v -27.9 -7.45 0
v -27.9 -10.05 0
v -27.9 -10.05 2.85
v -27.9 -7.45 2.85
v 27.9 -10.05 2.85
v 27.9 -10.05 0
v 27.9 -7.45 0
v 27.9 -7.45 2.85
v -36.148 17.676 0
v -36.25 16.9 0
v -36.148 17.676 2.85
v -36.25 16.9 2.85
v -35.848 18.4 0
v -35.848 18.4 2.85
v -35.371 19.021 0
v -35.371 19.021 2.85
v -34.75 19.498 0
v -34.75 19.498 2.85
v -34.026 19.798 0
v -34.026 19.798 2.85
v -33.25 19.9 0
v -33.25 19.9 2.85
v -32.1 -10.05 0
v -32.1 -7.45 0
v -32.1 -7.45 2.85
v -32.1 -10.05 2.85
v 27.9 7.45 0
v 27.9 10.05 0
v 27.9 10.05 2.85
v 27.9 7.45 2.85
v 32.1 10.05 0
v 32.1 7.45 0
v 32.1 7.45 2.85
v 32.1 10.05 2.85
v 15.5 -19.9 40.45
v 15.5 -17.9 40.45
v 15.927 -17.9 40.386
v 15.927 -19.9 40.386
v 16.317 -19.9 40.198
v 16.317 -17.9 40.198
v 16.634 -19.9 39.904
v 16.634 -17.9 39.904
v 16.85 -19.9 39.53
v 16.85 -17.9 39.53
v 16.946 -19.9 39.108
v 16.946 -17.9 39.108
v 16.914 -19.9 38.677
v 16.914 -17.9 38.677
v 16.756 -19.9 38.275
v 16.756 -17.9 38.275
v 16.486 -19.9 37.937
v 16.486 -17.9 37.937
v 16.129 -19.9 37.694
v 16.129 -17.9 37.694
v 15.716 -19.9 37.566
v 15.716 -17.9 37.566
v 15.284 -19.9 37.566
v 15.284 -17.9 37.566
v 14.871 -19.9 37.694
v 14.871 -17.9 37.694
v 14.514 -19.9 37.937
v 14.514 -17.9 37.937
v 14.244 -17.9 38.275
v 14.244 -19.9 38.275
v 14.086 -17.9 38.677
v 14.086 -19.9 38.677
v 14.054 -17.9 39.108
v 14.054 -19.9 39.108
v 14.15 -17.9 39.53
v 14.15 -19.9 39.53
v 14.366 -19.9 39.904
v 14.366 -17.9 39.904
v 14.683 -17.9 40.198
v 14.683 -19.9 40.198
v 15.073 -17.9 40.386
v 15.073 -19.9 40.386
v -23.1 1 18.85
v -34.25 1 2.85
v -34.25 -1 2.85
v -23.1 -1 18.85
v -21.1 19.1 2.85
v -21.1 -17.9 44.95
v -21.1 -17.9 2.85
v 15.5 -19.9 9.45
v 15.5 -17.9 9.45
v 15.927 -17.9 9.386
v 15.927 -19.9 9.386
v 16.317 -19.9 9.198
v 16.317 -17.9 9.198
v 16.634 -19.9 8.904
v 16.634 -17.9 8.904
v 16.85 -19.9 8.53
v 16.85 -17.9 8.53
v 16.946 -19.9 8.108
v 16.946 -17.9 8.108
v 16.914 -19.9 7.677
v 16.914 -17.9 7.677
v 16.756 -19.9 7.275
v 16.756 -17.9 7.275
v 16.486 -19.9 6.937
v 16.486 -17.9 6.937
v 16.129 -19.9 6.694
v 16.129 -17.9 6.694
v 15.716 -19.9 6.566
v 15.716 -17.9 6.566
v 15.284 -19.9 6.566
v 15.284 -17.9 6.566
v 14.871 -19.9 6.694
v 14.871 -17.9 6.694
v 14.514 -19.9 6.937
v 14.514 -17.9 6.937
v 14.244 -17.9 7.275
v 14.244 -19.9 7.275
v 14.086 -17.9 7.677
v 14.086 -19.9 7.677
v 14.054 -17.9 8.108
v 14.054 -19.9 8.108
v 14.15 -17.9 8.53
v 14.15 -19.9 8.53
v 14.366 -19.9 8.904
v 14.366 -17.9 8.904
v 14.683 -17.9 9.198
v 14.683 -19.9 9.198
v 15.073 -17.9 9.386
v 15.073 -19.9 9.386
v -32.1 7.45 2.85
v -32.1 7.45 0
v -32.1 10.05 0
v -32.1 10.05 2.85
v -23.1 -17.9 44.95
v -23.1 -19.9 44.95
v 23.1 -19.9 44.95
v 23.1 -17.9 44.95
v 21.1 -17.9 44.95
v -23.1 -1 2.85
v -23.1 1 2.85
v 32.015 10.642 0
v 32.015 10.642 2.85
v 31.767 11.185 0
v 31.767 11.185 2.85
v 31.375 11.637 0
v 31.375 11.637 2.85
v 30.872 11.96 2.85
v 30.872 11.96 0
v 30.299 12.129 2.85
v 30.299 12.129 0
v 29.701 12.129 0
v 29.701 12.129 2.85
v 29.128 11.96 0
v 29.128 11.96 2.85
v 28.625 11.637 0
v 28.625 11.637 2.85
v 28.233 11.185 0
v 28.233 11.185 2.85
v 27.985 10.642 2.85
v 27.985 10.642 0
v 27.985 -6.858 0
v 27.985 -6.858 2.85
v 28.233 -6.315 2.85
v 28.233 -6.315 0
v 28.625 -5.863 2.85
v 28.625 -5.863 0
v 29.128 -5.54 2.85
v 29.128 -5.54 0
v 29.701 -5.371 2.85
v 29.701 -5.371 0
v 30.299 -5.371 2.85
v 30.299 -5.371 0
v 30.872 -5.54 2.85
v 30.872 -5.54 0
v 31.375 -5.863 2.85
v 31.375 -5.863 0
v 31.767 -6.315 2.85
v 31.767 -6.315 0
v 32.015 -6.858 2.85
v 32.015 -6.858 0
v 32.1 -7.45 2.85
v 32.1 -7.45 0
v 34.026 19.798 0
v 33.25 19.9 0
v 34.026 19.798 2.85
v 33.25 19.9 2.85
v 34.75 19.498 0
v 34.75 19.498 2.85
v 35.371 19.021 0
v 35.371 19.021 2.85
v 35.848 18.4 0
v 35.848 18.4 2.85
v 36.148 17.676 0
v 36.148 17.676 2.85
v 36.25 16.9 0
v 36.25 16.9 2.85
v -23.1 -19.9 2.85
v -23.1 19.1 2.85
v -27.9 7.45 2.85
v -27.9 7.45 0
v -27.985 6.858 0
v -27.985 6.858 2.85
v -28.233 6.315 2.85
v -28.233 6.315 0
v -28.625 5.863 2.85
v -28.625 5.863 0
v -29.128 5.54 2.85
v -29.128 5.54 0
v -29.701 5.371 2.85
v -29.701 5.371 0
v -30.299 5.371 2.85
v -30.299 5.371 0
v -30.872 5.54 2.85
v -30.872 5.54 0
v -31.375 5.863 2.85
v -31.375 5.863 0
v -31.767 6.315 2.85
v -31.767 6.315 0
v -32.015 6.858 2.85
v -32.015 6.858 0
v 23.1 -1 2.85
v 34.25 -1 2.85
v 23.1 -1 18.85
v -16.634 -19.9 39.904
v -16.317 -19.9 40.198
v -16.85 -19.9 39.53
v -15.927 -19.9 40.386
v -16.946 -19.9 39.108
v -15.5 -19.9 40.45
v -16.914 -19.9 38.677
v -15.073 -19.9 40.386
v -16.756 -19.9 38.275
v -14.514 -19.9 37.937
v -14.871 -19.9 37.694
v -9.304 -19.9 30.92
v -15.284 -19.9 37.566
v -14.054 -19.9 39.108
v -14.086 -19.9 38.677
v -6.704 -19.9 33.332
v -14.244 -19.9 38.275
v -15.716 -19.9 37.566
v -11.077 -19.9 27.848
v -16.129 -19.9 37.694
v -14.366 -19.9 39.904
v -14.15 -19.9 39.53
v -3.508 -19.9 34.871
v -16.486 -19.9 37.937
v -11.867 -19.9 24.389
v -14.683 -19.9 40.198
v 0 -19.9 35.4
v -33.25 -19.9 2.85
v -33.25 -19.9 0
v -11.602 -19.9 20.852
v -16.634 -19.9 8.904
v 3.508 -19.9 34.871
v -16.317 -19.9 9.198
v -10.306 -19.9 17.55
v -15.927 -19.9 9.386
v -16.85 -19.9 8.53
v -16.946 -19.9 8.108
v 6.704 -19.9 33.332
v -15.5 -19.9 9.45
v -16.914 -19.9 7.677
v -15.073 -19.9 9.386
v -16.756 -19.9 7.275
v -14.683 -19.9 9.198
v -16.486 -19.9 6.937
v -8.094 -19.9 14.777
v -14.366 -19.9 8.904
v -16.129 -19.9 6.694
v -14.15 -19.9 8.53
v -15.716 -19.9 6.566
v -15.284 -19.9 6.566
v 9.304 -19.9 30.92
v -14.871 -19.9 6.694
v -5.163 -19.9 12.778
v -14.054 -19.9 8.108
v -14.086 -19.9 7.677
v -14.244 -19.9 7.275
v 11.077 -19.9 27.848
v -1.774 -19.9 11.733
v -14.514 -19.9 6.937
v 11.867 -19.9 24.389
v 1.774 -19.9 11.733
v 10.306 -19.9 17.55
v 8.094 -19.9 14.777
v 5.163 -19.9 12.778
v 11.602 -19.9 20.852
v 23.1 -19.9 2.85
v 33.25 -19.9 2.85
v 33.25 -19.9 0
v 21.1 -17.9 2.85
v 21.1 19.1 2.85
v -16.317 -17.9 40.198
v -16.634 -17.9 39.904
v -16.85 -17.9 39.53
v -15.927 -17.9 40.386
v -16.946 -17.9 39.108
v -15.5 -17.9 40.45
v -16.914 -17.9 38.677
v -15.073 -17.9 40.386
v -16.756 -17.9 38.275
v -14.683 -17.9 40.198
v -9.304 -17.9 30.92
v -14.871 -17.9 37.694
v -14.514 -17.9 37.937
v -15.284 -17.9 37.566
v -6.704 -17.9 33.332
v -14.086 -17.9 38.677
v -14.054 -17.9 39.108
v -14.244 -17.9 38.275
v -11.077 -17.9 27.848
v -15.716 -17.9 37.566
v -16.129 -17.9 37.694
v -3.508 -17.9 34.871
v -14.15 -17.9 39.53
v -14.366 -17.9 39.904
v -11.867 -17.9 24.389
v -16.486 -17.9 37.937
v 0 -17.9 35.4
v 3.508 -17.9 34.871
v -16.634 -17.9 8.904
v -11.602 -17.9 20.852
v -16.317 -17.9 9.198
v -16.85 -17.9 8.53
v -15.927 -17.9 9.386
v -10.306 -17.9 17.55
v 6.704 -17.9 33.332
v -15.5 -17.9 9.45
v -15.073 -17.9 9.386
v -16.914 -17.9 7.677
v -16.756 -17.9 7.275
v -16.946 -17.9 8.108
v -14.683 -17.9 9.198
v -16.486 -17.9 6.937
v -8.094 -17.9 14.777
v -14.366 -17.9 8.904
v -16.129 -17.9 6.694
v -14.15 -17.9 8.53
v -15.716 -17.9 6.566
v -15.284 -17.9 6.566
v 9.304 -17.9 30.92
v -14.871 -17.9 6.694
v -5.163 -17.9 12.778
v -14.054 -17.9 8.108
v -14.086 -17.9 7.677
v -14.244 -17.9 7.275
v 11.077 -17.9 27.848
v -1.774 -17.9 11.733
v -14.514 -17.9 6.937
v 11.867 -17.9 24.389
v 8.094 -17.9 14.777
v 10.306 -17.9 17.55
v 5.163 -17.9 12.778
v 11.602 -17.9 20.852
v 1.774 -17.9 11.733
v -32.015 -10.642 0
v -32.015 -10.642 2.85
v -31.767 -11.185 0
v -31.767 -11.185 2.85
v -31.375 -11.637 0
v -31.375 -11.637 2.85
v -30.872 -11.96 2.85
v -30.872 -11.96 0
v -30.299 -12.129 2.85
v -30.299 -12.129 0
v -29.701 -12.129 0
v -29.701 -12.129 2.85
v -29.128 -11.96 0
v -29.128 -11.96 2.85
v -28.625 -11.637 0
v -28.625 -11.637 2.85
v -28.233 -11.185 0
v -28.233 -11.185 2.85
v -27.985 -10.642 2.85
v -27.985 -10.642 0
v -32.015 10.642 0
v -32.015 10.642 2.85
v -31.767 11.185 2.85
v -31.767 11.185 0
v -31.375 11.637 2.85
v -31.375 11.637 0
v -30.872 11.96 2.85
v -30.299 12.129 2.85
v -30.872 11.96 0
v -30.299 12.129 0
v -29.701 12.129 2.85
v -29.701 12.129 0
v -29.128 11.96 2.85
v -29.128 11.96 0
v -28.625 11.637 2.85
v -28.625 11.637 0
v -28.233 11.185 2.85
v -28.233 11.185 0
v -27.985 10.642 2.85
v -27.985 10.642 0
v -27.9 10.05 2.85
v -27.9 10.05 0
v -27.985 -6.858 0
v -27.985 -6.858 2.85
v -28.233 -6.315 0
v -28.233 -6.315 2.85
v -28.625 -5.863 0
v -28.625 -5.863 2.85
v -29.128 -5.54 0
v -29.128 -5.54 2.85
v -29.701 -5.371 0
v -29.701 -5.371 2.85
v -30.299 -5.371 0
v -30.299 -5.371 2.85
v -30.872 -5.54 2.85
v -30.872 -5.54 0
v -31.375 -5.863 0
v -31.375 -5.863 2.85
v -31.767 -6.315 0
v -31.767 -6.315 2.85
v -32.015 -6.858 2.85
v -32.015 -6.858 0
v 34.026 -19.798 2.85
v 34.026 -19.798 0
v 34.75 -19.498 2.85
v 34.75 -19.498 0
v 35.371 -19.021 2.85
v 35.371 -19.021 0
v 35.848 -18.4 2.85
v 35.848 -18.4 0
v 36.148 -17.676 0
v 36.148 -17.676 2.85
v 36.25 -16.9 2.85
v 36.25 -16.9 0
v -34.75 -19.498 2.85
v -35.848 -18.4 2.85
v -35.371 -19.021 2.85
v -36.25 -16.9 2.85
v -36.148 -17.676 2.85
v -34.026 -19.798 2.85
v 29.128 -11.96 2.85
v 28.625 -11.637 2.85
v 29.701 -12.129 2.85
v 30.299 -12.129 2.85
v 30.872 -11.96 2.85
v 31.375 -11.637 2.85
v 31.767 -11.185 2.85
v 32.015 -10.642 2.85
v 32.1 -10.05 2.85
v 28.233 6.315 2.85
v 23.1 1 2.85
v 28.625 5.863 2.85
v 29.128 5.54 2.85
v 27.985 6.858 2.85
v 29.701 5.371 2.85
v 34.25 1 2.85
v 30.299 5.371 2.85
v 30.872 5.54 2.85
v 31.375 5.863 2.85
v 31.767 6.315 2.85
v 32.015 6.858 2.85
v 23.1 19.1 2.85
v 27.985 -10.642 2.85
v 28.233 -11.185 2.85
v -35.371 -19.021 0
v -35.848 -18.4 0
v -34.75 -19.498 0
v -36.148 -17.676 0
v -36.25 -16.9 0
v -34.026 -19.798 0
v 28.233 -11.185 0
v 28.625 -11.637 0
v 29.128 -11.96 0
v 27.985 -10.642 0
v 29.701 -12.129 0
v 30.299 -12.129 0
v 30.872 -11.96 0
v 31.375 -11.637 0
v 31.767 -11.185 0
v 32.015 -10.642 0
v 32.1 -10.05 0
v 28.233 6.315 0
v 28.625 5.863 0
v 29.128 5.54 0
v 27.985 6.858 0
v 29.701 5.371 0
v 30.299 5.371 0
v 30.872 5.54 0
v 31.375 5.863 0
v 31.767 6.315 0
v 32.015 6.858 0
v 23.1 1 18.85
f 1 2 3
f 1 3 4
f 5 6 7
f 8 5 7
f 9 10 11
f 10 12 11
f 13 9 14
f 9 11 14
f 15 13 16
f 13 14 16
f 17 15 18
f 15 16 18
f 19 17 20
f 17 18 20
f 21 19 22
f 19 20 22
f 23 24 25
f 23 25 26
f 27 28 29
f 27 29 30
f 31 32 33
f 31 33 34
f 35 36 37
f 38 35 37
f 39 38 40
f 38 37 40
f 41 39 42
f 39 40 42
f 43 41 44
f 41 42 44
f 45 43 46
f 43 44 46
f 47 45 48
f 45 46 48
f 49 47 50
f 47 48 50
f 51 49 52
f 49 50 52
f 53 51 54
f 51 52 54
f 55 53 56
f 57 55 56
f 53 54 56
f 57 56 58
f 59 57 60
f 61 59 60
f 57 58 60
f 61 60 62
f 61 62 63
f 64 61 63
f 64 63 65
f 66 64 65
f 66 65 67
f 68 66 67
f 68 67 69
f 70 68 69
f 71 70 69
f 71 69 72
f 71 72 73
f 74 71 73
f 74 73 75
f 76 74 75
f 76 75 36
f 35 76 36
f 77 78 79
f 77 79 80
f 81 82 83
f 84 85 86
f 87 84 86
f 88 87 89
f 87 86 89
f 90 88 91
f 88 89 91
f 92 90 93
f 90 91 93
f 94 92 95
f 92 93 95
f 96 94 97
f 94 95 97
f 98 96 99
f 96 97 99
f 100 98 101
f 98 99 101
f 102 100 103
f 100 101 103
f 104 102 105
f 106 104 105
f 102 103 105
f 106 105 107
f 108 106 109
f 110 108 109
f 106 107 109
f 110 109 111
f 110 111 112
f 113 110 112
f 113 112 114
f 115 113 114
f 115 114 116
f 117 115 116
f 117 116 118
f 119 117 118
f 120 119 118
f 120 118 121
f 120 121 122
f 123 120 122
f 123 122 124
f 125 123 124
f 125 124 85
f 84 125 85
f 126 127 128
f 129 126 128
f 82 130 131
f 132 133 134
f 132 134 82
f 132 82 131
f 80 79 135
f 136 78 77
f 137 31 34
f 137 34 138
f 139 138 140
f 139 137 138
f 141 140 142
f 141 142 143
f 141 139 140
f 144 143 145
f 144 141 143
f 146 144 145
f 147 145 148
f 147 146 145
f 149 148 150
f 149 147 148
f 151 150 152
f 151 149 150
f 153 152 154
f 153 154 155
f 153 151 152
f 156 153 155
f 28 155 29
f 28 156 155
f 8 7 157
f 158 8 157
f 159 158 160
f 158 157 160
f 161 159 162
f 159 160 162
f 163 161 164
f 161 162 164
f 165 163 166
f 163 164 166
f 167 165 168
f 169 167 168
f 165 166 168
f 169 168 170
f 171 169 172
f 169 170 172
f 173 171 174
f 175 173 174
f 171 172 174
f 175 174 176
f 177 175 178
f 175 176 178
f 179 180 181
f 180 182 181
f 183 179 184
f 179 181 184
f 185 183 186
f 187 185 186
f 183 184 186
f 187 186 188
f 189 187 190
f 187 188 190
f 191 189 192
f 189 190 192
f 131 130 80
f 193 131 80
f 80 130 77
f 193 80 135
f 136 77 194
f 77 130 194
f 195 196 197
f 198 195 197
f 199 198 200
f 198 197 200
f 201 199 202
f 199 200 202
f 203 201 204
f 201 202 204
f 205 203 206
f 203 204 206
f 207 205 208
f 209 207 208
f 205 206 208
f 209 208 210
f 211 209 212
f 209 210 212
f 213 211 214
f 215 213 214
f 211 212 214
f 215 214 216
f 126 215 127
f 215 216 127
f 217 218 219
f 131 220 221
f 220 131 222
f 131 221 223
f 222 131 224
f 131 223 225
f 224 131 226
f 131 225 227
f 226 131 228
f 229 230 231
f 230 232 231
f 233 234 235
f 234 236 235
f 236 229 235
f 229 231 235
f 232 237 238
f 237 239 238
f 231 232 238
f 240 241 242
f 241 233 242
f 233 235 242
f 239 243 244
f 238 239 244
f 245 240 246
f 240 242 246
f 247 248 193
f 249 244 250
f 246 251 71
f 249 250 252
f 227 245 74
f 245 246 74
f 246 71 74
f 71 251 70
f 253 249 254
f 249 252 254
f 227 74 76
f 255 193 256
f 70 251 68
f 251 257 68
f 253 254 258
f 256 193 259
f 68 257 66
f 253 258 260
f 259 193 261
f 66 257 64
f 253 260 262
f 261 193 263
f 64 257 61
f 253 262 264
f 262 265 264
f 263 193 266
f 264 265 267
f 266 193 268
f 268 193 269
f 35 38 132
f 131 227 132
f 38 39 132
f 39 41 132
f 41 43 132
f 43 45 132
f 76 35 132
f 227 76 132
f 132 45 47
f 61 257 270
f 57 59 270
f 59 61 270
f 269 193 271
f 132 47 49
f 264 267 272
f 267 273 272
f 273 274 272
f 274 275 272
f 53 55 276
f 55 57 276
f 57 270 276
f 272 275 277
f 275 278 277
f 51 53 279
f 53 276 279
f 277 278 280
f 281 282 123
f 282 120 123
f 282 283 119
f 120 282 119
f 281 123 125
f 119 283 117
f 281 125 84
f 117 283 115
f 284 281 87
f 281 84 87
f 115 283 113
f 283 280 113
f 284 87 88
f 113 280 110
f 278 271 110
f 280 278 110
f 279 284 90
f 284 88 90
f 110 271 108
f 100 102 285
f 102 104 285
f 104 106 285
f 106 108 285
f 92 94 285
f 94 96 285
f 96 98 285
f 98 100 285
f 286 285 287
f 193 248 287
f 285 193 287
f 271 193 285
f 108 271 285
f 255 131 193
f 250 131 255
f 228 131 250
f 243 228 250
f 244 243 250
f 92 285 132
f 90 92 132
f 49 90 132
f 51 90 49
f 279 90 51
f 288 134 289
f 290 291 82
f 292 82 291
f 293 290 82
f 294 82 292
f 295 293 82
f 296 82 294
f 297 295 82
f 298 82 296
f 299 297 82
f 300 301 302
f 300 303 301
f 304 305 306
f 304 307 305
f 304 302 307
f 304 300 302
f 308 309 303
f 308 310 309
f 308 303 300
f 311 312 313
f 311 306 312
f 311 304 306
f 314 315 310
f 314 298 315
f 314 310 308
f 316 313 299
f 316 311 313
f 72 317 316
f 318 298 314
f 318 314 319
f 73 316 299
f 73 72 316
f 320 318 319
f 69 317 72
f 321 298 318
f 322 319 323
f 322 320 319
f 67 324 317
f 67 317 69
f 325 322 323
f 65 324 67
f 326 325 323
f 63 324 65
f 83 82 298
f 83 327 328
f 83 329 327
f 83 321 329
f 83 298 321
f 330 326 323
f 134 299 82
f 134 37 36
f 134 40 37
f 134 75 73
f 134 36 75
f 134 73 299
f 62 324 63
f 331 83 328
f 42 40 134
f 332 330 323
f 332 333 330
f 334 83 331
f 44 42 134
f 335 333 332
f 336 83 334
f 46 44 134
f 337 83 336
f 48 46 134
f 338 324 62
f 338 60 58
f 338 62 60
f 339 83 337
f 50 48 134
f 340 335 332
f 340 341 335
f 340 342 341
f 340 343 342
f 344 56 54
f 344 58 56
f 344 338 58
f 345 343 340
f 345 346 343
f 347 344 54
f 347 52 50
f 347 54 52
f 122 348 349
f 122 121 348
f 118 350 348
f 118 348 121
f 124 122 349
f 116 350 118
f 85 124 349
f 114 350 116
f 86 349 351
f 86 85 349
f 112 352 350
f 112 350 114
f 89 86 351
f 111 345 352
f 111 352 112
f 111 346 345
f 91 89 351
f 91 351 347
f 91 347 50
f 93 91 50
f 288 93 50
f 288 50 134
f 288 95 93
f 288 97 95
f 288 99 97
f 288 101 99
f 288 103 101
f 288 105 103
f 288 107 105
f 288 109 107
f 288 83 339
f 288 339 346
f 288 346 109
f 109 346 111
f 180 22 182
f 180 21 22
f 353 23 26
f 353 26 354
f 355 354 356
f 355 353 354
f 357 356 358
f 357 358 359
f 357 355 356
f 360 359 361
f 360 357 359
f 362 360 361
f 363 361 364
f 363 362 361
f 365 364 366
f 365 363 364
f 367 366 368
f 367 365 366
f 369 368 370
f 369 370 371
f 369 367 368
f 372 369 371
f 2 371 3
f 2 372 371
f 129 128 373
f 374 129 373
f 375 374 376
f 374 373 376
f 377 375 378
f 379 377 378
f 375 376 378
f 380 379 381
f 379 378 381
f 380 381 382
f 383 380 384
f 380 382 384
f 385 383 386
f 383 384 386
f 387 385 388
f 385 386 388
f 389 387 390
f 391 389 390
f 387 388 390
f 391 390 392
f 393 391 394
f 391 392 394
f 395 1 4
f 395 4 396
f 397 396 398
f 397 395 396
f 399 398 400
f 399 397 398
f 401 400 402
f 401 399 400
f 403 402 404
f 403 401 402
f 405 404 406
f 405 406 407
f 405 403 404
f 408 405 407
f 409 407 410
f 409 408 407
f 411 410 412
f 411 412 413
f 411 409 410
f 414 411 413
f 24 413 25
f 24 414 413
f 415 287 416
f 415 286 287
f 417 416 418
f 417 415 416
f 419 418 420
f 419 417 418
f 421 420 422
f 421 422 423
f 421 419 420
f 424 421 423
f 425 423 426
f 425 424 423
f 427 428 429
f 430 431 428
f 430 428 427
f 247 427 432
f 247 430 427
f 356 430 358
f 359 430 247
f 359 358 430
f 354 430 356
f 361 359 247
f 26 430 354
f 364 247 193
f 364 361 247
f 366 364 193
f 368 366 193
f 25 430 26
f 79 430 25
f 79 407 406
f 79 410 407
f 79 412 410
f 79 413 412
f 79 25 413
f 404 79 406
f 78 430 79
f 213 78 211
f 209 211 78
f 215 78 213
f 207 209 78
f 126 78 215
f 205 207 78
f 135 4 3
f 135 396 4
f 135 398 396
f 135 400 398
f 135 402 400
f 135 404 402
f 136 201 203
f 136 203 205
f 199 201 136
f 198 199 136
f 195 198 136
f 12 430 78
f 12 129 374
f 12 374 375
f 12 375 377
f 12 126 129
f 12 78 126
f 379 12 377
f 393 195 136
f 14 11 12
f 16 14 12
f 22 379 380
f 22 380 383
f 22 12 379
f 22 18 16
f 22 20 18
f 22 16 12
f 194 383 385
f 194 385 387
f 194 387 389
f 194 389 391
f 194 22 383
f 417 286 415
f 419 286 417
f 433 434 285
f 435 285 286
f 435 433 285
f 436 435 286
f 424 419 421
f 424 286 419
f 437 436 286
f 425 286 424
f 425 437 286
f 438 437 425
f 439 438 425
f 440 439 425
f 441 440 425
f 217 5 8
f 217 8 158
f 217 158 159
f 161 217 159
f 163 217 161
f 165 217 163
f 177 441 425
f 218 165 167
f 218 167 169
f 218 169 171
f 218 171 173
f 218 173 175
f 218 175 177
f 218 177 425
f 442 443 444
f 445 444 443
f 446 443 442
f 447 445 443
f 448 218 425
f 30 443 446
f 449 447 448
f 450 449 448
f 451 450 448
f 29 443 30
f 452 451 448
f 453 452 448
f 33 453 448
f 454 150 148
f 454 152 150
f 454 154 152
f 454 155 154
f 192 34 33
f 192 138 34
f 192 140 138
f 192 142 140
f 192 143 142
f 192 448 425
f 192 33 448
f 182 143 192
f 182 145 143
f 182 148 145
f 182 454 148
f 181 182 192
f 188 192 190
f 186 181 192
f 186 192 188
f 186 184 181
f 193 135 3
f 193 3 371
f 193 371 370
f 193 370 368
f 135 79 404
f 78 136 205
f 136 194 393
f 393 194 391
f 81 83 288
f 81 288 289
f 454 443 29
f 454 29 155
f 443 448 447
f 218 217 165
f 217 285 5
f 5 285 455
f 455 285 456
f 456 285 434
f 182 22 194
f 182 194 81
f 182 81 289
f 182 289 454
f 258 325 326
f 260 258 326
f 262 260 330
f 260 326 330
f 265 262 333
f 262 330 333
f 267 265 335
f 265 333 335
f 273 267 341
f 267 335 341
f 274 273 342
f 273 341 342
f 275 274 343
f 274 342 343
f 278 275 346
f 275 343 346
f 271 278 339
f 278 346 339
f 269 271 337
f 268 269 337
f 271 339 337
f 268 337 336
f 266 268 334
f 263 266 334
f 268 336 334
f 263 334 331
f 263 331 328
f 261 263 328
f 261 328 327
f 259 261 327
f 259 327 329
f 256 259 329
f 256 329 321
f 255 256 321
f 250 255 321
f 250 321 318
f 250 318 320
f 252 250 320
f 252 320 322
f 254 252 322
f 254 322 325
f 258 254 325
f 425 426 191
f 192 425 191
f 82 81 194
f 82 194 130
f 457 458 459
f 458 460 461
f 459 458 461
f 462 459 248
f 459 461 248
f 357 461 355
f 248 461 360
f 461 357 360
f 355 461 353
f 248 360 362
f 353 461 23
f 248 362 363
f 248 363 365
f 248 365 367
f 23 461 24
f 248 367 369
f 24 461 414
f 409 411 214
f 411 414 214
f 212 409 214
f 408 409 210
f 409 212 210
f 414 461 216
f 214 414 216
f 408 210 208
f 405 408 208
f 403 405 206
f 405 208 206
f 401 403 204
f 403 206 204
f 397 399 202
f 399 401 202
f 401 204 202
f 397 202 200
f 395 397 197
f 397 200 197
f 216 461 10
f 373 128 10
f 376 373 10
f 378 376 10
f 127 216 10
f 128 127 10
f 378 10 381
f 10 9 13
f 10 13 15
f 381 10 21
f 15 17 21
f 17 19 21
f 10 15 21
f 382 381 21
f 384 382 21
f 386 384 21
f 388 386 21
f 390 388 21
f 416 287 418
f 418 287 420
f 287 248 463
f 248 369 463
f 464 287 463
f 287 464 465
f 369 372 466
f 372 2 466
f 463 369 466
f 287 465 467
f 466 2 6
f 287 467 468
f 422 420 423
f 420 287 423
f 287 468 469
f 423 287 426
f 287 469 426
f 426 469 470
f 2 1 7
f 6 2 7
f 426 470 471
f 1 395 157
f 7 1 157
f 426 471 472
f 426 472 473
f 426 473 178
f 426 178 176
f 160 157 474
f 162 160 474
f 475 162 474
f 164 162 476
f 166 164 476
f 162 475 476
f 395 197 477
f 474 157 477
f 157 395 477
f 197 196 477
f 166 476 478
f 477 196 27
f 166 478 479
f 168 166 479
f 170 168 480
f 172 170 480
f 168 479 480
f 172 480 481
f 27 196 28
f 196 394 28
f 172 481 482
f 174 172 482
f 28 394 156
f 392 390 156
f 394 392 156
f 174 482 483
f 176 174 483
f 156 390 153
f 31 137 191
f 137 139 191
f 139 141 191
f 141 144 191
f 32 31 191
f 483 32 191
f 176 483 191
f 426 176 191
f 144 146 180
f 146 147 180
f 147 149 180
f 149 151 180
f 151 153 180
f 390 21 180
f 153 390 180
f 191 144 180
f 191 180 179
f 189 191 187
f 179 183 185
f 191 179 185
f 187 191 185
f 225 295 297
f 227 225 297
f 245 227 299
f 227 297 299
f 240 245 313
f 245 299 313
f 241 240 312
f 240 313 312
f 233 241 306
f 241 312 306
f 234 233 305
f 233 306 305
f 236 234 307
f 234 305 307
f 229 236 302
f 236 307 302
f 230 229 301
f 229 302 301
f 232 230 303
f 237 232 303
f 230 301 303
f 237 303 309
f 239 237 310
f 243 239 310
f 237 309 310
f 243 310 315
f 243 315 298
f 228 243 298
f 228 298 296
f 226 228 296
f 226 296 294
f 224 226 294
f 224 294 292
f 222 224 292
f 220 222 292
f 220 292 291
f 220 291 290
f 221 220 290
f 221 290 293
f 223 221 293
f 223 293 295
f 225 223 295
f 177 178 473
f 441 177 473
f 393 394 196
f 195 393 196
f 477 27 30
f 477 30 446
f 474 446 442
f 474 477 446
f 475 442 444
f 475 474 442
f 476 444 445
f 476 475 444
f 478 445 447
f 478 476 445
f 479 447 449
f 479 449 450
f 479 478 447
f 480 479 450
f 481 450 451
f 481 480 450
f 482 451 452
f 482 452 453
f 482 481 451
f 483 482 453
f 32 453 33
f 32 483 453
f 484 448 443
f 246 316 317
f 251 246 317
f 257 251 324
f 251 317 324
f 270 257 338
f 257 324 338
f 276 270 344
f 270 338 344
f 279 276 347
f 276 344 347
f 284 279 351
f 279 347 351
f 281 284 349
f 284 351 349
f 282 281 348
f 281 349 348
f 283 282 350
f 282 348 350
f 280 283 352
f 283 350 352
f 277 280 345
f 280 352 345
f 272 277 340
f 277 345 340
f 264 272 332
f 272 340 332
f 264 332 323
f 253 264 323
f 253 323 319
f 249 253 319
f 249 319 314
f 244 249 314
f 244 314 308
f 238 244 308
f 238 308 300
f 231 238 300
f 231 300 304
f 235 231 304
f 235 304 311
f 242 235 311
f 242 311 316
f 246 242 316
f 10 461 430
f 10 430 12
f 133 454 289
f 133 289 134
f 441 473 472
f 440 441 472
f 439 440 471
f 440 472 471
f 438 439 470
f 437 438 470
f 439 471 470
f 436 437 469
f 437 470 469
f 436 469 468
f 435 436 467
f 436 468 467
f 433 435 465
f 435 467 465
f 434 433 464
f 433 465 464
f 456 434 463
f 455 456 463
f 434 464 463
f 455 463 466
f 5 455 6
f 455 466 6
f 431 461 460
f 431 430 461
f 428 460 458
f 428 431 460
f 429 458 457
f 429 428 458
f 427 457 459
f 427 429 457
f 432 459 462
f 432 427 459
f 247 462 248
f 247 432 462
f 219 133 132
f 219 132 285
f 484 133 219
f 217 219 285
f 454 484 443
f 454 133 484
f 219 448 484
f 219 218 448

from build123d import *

# Parameters (mm, degrees)
SKETCH1_W           = 72.5
SKETCH1_H           = 39.8
BOSS_EXTRUDE1_DEPTH = 2.85
BOSS_EXTRUDE2_DEPTH = 23.1
SKETCH5_W           = 42.2
SKETCH5_H           = 42.1
CUT_EXTRUDE1_DEPTH  = 37.8
CUT_EXTRUDE2_REACH  = 71.017
SKETCH6_R           = 1.45
SKETCH6_R_2         = 11.9
FILLET1_R           = 3
BOSS_EXTRUDE3_DEPTH = 1


with BuildPart() as part:
    # Sketch1 → Boss-Extrude1 (new body)
    with BuildSketch(Plane.XY):
        Rectangle(SKETCH1_W, SKETCH1_H)
        with BuildLine():
            Line((-27.9, 10.05), (-27.9, 7.45))
            ThreePointArc((-27.9, 7.45), (-30, 5.35), (-32.1, 7.45))
            Line((-32.1, 7.45), (-32.1, 10.05))
            ThreePointArc((-32.1, 10.05), (-30, 12.15), (-27.9, 10.05))
        make_face(mode=Mode.SUBTRACT)
        with BuildLine():
            Line((-27.9, -10.05), (-27.9, -7.45))
            ThreePointArc((-27.9, -7.45), (-30, -5.35), (-32.1, -7.45))
            Line((-32.1, -7.45), (-32.1, -10.05))
            ThreePointArc((-32.1, -10.05), (-30, -12.15), (-27.9, -10.05))
        make_face(mode=Mode.SUBTRACT)
        with BuildLine():
            Line((27.9, 10.05), (27.9, 7.45))
            ThreePointArc((27.9, 7.45), (30, 5.35), (32.1, 7.45))
            Line((32.1, 7.45), (32.1, 10.05))
            ThreePointArc((32.1, 10.05), (30, 12.15), (27.9, 10.05))
        make_face(mode=Mode.SUBTRACT)
        with BuildLine():
            Line((27.9, -10.05), (27.9, -7.45))
            ThreePointArc((27.9, -7.45), (30, -5.35), (32.1, -7.45))
            Line((32.1, -7.45), (32.1, -10.05))
            ThreePointArc((32.1, -10.05), (30, -12.15), (27.9, -10.05))
        make_face(mode=Mode.SUBTRACT)
    extrude(amount=BOSS_EXTRUDE1_DEPTH)

    # Sketch4 → Boss-Extrude2 (add, symmetric)
    with BuildSketch(Plane(origin=(0, 0, 0), x_dir=(0, 0, -1), z_dir=(1, 0, 0))):
        Polygon((-2.85, 19.1), (-44.95, -17.9), (-44.95, -19.9), (-2.85, -19.9), align=None)
    extrude(amount=BOSS_EXTRUDE2_DEPTH, both=True)

    # Sketch5 → Cut-Extrude1 (cut)
    with BuildSketch(Plane(origin=(0, 19.9, 0), x_dir=(1, 0, 0), z_dir=(0, 1, 0))):
        with Locations((0, -23.9)):
            Rectangle(SKETCH5_W, SKETCH5_H)
    extrude(amount=-CUT_EXTRUDE1_DEPTH, mode=Mode.SUBTRACT)

    # Sketch6 → Cut-Extrude2 (cut, up to next)
    with BuildSketch(Plane(origin=(0, -17.9, 0), x_dir=(1, 0, 0), z_dir=(0, 1, 0)), mode=Mode.PRIVATE) as cut_extrude2_sk1:
        with Locations(Location((-15.5, -8, 0), (0, 0, 270))):
            Circle(SKETCH6_R)
    cut_extrude2_tool1 = extrude(cut_extrude2_sk1.sketch, amount=-CUT_EXTRUDE2_REACH, mode=Mode.PRIVATE) & part.part
    # Sketch6 → Cut-Extrude2 (cut, up to next)
    with BuildSketch(Plane(origin=(0, -17.9, 0), x_dir=(1, 0, 0), z_dir=(0, 1, 0)), mode=Mode.PRIVATE) as cut_extrude2_sk2:
        with Locations(Location((15.5, -8, 0), (0, 0, 270))):
            Circle(SKETCH6_R)
    cut_extrude2_tool2 = extrude(cut_extrude2_sk2.sketch, amount=-CUT_EXTRUDE2_REACH, mode=Mode.PRIVATE) & part.part
    # Sketch6 → Cut-Extrude2 (cut, up to next)
    with BuildSketch(Plane(origin=(0, -17.9, 0), x_dir=(1, 0, 0), z_dir=(0, 1, 0)), mode=Mode.PRIVATE) as cut_extrude2_sk3:
        with Locations(Location((15.5, -39, 0), (0, 0, 270))):
            Circle(SKETCH6_R)
    cut_extrude2_tool3 = extrude(cut_extrude2_sk3.sketch, amount=-CUT_EXTRUDE2_REACH, mode=Mode.PRIVATE) & part.part
    # Sketch6 → Cut-Extrude2 (cut, up to next)
    with BuildSketch(Plane(origin=(0, -17.9, 0), x_dir=(1, 0, 0), z_dir=(0, 1, 0)), mode=Mode.PRIVATE) as cut_extrude2_sk4:
        with Locations(Location((-15.5, -39, 0), (0, 0, 270))):
            Circle(SKETCH6_R)
    cut_extrude2_tool4 = extrude(cut_extrude2_sk4.sketch, amount=-CUT_EXTRUDE2_REACH, mode=Mode.PRIVATE) & part.part
    # Sketch6 → Cut-Extrude2 (cut, up to next)
    with BuildSketch(Plane(origin=(0, -17.9, 0), x_dir=(1, 0, 0), z_dir=(0, 1, 0)), mode=Mode.PRIVATE) as cut_extrude2_sk5:
        with Locations(Location((0, -23.5, 0), (0, 0, 270))):
            Circle(SKETCH6_R_2)
    cut_extrude2_tool5 = extrude(cut_extrude2_sk5.sketch, amount=-CUT_EXTRUDE2_REACH, mode=Mode.PRIVATE) & part.part
    add(cut_extrude2_tool1.solids().sort_by_distance((-15.5, -17.9, 8))[0], mode=Mode.SUBTRACT)
    add(cut_extrude2_tool2.solids().sort_by_distance((15.5, -17.9, 8))[0], mode=Mode.SUBTRACT)
    add(cut_extrude2_tool3.solids().sort_by_distance((15.5, -17.9, 39))[0], mode=Mode.SUBTRACT)
    add(cut_extrude2_tool4.solids().sort_by_distance((-15.5, -17.9, 39))[0], mode=Mode.SUBTRACT)
    add(cut_extrude2_tool5.solids().sort_by_distance((0, -17.9, 23.5))[0], mode=Mode.SUBTRACT)

    # Fillet1
    fillet1_edges = [part.edges().sort_by_distance(p)[0] for p in [
        (-36.25, 19.9, 1.425),
        (36.25, 19.9, 1.425),
        (36.25, -19.9, 1.425),
        (-36.25, -19.9, 1.425),
    ]]
    fillet(fillet1_edges, radius=FILLET1_R)

    # Sketch7 → Boss-Extrude3 (add, symmetric)
    with BuildSketch(Plane(origin=(0, 0, 0), x_dir=(1, 0, 0), z_dir=(0, 1, 0))):
        Polygon((34.25, -2.85), (23.1, -18.85), (23.1, -2.85), align=None)
        Polygon((-23.1, -2.85), (-34.25, -2.85), (-23.1, -18.85), align=None)
    extrude(amount=BOSS_EXTRUDE3_DEPTH, both=True)


solid = part.part
